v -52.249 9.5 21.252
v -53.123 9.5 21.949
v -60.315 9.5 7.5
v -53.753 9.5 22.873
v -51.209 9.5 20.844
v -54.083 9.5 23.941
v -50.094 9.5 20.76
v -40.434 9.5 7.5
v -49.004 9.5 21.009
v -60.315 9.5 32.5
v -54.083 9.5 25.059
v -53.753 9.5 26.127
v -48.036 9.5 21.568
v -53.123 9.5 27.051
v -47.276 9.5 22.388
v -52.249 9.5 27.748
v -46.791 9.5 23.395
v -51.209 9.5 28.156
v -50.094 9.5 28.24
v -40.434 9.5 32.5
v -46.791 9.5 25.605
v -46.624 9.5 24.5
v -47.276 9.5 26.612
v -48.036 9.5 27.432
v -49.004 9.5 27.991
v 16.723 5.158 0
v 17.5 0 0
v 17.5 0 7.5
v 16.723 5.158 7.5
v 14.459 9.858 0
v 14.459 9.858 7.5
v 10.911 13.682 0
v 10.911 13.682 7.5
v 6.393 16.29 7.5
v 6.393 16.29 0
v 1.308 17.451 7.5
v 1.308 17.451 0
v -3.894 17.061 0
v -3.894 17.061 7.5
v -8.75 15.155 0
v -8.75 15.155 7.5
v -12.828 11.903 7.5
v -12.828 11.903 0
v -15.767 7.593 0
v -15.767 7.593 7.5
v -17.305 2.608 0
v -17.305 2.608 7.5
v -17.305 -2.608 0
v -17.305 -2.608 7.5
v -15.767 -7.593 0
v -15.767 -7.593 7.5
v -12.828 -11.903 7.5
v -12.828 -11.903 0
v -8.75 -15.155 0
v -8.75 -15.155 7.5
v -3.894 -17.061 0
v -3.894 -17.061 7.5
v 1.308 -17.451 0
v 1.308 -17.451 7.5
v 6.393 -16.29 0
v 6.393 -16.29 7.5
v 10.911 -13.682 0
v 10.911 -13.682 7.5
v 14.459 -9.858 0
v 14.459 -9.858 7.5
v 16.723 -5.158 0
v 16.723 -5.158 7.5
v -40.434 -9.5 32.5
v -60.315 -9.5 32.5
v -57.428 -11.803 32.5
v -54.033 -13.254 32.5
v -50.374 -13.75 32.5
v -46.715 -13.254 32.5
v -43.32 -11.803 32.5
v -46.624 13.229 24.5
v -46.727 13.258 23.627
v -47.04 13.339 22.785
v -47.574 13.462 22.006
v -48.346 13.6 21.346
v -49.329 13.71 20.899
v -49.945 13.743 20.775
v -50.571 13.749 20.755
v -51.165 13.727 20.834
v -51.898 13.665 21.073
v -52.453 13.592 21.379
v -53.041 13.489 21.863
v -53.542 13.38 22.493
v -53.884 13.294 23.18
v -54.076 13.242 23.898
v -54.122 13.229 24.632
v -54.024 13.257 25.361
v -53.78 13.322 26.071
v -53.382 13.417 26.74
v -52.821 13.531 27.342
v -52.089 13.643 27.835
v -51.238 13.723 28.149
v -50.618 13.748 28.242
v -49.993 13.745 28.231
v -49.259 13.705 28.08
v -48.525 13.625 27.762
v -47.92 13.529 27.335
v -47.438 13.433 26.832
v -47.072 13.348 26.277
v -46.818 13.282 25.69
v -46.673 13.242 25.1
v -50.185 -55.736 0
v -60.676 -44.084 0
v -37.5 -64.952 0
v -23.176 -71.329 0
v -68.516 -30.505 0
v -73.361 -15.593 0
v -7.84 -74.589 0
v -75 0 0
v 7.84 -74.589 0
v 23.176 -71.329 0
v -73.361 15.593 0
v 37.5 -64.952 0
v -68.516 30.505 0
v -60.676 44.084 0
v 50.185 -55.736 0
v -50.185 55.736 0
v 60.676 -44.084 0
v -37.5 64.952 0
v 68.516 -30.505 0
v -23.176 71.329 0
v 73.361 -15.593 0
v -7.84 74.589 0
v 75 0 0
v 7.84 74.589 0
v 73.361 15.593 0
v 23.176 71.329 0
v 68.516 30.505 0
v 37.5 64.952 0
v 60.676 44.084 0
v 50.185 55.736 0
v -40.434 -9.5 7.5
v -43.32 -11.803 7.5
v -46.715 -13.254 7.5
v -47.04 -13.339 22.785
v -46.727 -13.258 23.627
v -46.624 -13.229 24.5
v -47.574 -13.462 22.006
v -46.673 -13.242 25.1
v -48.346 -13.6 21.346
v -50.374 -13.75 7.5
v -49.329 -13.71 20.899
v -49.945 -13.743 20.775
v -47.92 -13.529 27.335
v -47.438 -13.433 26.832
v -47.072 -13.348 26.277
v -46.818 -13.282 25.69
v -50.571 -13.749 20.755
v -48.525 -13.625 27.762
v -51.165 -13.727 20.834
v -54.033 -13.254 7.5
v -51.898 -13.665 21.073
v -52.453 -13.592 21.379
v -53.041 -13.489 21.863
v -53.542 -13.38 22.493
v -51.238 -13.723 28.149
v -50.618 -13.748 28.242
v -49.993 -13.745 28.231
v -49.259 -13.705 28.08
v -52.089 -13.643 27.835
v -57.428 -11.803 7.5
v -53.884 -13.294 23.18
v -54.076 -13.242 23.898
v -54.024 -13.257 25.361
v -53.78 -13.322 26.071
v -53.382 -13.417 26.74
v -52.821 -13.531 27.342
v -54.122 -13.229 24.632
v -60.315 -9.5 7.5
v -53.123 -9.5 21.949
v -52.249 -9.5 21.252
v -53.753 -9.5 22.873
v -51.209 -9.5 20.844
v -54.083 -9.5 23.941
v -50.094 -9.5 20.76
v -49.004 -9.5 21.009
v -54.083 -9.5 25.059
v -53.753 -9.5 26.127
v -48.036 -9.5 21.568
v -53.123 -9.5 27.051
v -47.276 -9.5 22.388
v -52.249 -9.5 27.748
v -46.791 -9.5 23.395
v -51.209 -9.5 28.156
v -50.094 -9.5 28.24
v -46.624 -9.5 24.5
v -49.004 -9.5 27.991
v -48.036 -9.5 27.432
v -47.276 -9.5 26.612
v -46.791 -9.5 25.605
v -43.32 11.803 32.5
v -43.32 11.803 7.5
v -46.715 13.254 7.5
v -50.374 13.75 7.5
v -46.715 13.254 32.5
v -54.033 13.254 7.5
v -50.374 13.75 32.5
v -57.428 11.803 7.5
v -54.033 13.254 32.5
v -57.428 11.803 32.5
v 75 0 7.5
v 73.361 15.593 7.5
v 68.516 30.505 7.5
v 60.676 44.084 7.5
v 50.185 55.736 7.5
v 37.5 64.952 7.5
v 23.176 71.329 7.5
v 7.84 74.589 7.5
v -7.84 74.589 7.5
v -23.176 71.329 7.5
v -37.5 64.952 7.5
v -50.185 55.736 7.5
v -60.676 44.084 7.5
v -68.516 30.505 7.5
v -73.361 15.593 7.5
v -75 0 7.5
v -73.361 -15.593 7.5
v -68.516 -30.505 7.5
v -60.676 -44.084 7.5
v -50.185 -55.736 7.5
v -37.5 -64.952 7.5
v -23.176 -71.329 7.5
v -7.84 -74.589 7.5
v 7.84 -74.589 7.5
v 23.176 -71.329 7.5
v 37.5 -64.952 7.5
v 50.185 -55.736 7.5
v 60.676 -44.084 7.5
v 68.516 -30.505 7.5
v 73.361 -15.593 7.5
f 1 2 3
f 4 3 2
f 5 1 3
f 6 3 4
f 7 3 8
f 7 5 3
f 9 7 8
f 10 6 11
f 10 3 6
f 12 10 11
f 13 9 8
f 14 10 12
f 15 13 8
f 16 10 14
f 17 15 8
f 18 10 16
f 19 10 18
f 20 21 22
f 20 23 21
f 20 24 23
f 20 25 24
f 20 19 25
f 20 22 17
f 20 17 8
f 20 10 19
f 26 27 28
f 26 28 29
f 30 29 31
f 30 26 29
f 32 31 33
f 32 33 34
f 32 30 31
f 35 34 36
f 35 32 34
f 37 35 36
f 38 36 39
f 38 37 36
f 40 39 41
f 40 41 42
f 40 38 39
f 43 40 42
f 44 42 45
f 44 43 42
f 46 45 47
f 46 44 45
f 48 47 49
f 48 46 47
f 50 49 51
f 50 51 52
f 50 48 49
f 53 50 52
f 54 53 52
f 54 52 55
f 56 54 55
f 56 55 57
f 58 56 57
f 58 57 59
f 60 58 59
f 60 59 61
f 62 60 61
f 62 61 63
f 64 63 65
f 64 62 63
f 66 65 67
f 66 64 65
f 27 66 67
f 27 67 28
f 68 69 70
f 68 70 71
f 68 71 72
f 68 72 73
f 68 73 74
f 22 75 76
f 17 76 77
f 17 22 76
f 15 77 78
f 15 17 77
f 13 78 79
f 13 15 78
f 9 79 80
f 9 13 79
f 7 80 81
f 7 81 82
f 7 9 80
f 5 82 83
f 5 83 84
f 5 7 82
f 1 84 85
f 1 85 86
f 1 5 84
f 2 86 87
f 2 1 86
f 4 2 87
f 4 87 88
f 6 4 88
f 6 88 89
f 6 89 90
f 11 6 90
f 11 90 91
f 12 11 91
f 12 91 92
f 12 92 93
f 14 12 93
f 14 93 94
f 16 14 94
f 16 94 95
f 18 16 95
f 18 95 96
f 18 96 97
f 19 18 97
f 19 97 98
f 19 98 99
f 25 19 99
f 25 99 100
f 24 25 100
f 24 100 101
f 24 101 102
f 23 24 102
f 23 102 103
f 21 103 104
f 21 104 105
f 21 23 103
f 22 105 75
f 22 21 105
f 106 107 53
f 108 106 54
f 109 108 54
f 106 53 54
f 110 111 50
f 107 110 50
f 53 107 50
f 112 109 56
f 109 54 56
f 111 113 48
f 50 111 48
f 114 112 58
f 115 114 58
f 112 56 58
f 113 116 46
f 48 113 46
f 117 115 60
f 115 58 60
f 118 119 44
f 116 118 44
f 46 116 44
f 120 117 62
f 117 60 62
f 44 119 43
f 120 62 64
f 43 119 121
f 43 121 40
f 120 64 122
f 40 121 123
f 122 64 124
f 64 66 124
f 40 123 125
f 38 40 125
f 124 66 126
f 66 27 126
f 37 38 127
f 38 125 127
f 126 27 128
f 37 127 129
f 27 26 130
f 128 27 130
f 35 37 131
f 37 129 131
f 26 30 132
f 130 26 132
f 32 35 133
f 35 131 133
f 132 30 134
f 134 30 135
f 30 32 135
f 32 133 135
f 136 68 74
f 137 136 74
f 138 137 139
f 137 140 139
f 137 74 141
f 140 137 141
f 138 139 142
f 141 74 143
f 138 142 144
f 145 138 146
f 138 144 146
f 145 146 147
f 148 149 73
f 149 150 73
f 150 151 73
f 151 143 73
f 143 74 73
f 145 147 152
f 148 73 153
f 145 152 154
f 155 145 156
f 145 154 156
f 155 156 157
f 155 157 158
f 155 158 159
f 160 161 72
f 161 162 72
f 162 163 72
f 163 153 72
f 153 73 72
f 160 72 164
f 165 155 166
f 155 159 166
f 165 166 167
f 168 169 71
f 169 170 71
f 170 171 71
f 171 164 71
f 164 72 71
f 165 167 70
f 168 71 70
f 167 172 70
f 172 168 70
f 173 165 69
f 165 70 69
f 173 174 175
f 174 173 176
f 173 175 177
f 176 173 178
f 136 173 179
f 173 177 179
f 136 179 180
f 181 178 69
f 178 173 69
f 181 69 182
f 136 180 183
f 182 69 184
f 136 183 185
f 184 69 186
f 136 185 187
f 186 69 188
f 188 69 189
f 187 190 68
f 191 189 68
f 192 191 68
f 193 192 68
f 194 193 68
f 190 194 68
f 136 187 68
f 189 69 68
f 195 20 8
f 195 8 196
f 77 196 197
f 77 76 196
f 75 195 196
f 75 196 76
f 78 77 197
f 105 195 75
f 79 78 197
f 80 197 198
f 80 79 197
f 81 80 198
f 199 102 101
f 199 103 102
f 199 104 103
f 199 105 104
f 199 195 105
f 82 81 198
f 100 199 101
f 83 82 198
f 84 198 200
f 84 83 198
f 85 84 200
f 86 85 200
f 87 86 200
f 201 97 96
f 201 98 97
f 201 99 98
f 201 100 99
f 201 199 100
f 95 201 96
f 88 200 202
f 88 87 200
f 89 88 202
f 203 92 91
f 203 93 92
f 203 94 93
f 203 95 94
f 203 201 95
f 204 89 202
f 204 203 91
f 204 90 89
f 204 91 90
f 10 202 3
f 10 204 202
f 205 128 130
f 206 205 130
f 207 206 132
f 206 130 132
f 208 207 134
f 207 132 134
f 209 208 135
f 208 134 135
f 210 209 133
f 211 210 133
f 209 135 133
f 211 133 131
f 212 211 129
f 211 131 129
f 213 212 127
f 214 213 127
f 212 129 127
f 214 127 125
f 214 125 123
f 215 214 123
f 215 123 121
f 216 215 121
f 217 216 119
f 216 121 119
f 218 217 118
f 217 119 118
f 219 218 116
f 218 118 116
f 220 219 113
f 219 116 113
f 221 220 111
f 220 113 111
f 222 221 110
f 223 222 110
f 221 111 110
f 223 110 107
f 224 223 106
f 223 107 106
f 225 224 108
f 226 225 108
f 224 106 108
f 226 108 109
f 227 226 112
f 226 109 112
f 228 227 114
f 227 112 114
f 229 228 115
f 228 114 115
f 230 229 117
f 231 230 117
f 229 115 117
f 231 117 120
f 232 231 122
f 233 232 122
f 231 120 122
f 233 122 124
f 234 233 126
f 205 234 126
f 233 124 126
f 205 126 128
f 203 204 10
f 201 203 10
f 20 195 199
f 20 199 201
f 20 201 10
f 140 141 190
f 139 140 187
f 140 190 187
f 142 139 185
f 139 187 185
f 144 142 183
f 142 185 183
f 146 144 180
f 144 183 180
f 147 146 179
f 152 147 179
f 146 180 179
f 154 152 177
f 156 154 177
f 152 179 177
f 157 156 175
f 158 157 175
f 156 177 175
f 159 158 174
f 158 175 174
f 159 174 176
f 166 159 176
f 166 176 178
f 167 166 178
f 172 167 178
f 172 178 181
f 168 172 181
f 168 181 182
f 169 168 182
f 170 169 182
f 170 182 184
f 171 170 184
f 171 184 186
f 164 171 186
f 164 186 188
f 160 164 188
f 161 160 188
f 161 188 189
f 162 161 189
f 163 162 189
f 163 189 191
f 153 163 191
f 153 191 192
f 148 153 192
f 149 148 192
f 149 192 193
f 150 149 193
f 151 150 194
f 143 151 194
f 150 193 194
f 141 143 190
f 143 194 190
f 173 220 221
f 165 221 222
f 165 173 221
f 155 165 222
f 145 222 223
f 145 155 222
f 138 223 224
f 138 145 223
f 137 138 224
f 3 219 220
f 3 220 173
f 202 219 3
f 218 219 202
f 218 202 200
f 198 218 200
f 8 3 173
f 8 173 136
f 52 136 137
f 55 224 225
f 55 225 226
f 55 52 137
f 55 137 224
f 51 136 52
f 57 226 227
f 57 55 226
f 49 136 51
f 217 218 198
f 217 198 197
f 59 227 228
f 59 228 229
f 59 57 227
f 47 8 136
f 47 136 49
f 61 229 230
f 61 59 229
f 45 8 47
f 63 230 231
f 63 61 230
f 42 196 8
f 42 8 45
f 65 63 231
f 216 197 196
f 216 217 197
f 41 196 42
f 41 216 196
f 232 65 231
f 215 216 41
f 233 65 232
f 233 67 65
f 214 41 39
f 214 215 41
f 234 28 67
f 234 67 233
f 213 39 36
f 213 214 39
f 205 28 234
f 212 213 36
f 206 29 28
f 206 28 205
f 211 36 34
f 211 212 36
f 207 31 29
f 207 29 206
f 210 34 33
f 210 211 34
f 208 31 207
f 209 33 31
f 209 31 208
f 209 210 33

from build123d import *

# Parameters (mm, degrees)
SKETCH1_R               = 75
SKETCH1_R_2             = 17.5
BOSS_EXTRUDE2_DEPTH     = 7.5
SKETCH2_R               = 13.75
BOSS_EXTRUDE3_DEPTH     = 25
SKETCH3_OUTSIDE_W       = 194.922
SKETCH3_OUTSIDE_H       = 194.922
CUT_EXTRUDE3_DEPTH      = 25
SKETCH6_R               = 3.75
CUT_EXTRUDE4_DEPTH      = 85.5
CUT_EXTRUDE4_DEPTH_BACK = 66.5


with BuildPart() as part:
    # Sketch1 → Boss-Extrude2 (new body)
    with BuildSketch(Plane.XY):
        Circle(SKETCH1_R)
        Circle(SKETCH1_R_2, mode=Mode.SUBTRACT)
    extrude(amount=BOSS_EXTRUDE2_DEPTH)

    # Sketch2 → Boss-Extrude3 (add)
    with BuildSketch(Plane.XY.offset(7.5)):
        with Locations((-50.374404357, 0)):
            Circle(SKETCH2_R)
    extrude(amount=BOSS_EXTRUDE3_DEPTH)

    # Sketch3 outside → Cut-Extrude3 (cut)
    with BuildSketch(Plane.XY.offset(32.5)):
        Rectangle(SKETCH3_OUTSIDE_W, SKETCH3_OUTSIDE_H)
        with BuildLine():
            Line((-60.314852033, 9.5), (-40.433956681, 9.5))
            ThreePointArc((-40.433956681, 9.5), (-50.374404357, 13.75), (-60.314852033, 9.5))
        make_face(mode=Mode.SUBTRACT)
        with BuildLine():
            Line((-60.314852033, -9.5), (-40.433956681, -9.5))
            ThreePointArc((-40.433956681, -9.5), (-50.374404357, -13.75), (-60.314852033, -9.5))
        make_face(mode=Mode.SUBTRACT)
    extrude(amount=-CUT_EXTRUDE3_DEPTH, mode=Mode.SUBTRACT)

    # Sketch6 → Cut-Extrude4 (cut, two sides)
    with BuildSketch(Plane(origin=(0, -9.5, 0), x_dir=(1, 0, 0), z_dir=(0, 1, 0))) as cut_extrude4_sk:
        with Locations((-50.374404357, -24.5)):
            Circle(SKETCH6_R)
    extrude(amount=CUT_EXTRUDE4_DEPTH, mode=Mode.SUBTRACT)
    extrude(cut_extrude4_sk.sketch, amount=-CUT_EXTRUDE4_DEPTH_BACK, mode=Mode.SUBTRACT)


solid = part.part
